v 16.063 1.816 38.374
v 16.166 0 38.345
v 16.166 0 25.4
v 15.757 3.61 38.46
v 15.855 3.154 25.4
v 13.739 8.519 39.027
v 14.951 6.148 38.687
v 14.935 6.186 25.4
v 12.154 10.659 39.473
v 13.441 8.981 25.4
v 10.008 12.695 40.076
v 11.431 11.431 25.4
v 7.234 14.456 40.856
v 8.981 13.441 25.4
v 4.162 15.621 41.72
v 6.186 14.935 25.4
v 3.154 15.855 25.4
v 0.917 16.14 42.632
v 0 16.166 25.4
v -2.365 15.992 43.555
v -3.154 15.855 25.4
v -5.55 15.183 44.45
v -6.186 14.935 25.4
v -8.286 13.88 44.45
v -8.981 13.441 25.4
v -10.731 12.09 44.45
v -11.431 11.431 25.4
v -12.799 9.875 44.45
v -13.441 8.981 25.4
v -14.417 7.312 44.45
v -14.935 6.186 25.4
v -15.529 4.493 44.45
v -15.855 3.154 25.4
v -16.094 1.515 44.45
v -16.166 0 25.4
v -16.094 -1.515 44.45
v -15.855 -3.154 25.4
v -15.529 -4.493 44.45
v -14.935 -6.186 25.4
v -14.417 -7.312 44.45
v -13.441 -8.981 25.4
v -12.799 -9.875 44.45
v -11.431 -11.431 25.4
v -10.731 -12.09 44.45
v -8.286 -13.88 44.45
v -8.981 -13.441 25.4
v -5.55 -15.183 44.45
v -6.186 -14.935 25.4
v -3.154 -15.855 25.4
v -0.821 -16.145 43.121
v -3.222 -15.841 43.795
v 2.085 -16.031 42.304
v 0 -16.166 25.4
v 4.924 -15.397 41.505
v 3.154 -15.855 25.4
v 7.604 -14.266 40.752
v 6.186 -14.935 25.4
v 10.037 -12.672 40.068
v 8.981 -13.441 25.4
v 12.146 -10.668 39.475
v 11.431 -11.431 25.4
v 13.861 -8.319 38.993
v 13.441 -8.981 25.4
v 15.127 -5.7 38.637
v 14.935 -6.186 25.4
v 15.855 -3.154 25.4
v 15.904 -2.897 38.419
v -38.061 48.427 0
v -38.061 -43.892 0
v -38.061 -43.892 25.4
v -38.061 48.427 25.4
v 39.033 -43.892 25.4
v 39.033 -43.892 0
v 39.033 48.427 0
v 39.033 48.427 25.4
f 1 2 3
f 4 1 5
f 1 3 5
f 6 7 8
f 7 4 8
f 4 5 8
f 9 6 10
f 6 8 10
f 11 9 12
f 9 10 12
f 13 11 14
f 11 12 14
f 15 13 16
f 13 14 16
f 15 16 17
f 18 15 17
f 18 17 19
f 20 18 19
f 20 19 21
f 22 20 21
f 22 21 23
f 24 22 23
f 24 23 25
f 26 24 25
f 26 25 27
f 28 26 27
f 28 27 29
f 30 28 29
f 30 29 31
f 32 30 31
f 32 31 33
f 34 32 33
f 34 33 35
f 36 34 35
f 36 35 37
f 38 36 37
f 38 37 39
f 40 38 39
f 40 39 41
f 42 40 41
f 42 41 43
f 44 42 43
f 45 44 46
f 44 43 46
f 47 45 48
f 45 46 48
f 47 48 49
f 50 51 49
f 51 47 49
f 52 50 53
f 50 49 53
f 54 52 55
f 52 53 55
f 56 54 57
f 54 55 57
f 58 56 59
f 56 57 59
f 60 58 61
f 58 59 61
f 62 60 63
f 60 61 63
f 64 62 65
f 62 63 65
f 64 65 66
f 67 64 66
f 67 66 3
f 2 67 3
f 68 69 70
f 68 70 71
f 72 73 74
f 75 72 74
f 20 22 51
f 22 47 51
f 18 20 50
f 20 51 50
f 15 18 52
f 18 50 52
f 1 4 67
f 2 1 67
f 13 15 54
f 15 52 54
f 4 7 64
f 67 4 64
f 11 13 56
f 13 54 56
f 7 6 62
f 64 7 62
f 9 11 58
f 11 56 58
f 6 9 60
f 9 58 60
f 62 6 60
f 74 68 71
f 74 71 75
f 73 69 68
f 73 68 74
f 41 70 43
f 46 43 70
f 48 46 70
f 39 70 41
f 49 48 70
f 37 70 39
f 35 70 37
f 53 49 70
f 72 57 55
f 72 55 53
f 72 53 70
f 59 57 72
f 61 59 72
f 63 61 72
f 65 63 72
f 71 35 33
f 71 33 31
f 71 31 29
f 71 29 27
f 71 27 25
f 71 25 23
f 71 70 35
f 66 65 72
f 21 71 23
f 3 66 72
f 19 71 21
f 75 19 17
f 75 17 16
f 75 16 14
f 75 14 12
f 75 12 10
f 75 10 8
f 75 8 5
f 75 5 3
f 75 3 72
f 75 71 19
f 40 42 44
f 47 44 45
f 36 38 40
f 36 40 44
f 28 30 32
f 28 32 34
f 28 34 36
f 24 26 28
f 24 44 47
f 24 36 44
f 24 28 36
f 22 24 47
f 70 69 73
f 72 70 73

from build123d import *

# Parameters (mm, degrees)
F0_W     = 77.094659
F0_H     = 92.319232
F1_DEPTH = 25.4
F2_R     = 16.165555
F3_DEPTH = 44.45
F5_DEPTH = 114.3


with BuildPart() as f1:
    # F0 (on Top) → F1 (new body)
    with BuildSketch(Plane.XY):
        with Locations((0.485893, 2.267493)):
            Rectangle(F0_W, F0_H)
    extrude(amount=F1_DEPTH)

    # F2 (on Top) → F3 (join)
    with BuildSketch(Plane.XY):
        Circle(F2_R)
    extrude(amount=F3_DEPTH)

    # F4 (on Front) → F5 (cut, symmetric)
    with BuildSketch(Plane.XZ):
        Polygon((39.681073, 63.003831), (-43.892127, 55.229578), (47.131397, 29.639332), align=None)
    extrude(amount=F5_DEPTH, both=True, mode=Mode.SUBTRACT)


solid = f1.part
